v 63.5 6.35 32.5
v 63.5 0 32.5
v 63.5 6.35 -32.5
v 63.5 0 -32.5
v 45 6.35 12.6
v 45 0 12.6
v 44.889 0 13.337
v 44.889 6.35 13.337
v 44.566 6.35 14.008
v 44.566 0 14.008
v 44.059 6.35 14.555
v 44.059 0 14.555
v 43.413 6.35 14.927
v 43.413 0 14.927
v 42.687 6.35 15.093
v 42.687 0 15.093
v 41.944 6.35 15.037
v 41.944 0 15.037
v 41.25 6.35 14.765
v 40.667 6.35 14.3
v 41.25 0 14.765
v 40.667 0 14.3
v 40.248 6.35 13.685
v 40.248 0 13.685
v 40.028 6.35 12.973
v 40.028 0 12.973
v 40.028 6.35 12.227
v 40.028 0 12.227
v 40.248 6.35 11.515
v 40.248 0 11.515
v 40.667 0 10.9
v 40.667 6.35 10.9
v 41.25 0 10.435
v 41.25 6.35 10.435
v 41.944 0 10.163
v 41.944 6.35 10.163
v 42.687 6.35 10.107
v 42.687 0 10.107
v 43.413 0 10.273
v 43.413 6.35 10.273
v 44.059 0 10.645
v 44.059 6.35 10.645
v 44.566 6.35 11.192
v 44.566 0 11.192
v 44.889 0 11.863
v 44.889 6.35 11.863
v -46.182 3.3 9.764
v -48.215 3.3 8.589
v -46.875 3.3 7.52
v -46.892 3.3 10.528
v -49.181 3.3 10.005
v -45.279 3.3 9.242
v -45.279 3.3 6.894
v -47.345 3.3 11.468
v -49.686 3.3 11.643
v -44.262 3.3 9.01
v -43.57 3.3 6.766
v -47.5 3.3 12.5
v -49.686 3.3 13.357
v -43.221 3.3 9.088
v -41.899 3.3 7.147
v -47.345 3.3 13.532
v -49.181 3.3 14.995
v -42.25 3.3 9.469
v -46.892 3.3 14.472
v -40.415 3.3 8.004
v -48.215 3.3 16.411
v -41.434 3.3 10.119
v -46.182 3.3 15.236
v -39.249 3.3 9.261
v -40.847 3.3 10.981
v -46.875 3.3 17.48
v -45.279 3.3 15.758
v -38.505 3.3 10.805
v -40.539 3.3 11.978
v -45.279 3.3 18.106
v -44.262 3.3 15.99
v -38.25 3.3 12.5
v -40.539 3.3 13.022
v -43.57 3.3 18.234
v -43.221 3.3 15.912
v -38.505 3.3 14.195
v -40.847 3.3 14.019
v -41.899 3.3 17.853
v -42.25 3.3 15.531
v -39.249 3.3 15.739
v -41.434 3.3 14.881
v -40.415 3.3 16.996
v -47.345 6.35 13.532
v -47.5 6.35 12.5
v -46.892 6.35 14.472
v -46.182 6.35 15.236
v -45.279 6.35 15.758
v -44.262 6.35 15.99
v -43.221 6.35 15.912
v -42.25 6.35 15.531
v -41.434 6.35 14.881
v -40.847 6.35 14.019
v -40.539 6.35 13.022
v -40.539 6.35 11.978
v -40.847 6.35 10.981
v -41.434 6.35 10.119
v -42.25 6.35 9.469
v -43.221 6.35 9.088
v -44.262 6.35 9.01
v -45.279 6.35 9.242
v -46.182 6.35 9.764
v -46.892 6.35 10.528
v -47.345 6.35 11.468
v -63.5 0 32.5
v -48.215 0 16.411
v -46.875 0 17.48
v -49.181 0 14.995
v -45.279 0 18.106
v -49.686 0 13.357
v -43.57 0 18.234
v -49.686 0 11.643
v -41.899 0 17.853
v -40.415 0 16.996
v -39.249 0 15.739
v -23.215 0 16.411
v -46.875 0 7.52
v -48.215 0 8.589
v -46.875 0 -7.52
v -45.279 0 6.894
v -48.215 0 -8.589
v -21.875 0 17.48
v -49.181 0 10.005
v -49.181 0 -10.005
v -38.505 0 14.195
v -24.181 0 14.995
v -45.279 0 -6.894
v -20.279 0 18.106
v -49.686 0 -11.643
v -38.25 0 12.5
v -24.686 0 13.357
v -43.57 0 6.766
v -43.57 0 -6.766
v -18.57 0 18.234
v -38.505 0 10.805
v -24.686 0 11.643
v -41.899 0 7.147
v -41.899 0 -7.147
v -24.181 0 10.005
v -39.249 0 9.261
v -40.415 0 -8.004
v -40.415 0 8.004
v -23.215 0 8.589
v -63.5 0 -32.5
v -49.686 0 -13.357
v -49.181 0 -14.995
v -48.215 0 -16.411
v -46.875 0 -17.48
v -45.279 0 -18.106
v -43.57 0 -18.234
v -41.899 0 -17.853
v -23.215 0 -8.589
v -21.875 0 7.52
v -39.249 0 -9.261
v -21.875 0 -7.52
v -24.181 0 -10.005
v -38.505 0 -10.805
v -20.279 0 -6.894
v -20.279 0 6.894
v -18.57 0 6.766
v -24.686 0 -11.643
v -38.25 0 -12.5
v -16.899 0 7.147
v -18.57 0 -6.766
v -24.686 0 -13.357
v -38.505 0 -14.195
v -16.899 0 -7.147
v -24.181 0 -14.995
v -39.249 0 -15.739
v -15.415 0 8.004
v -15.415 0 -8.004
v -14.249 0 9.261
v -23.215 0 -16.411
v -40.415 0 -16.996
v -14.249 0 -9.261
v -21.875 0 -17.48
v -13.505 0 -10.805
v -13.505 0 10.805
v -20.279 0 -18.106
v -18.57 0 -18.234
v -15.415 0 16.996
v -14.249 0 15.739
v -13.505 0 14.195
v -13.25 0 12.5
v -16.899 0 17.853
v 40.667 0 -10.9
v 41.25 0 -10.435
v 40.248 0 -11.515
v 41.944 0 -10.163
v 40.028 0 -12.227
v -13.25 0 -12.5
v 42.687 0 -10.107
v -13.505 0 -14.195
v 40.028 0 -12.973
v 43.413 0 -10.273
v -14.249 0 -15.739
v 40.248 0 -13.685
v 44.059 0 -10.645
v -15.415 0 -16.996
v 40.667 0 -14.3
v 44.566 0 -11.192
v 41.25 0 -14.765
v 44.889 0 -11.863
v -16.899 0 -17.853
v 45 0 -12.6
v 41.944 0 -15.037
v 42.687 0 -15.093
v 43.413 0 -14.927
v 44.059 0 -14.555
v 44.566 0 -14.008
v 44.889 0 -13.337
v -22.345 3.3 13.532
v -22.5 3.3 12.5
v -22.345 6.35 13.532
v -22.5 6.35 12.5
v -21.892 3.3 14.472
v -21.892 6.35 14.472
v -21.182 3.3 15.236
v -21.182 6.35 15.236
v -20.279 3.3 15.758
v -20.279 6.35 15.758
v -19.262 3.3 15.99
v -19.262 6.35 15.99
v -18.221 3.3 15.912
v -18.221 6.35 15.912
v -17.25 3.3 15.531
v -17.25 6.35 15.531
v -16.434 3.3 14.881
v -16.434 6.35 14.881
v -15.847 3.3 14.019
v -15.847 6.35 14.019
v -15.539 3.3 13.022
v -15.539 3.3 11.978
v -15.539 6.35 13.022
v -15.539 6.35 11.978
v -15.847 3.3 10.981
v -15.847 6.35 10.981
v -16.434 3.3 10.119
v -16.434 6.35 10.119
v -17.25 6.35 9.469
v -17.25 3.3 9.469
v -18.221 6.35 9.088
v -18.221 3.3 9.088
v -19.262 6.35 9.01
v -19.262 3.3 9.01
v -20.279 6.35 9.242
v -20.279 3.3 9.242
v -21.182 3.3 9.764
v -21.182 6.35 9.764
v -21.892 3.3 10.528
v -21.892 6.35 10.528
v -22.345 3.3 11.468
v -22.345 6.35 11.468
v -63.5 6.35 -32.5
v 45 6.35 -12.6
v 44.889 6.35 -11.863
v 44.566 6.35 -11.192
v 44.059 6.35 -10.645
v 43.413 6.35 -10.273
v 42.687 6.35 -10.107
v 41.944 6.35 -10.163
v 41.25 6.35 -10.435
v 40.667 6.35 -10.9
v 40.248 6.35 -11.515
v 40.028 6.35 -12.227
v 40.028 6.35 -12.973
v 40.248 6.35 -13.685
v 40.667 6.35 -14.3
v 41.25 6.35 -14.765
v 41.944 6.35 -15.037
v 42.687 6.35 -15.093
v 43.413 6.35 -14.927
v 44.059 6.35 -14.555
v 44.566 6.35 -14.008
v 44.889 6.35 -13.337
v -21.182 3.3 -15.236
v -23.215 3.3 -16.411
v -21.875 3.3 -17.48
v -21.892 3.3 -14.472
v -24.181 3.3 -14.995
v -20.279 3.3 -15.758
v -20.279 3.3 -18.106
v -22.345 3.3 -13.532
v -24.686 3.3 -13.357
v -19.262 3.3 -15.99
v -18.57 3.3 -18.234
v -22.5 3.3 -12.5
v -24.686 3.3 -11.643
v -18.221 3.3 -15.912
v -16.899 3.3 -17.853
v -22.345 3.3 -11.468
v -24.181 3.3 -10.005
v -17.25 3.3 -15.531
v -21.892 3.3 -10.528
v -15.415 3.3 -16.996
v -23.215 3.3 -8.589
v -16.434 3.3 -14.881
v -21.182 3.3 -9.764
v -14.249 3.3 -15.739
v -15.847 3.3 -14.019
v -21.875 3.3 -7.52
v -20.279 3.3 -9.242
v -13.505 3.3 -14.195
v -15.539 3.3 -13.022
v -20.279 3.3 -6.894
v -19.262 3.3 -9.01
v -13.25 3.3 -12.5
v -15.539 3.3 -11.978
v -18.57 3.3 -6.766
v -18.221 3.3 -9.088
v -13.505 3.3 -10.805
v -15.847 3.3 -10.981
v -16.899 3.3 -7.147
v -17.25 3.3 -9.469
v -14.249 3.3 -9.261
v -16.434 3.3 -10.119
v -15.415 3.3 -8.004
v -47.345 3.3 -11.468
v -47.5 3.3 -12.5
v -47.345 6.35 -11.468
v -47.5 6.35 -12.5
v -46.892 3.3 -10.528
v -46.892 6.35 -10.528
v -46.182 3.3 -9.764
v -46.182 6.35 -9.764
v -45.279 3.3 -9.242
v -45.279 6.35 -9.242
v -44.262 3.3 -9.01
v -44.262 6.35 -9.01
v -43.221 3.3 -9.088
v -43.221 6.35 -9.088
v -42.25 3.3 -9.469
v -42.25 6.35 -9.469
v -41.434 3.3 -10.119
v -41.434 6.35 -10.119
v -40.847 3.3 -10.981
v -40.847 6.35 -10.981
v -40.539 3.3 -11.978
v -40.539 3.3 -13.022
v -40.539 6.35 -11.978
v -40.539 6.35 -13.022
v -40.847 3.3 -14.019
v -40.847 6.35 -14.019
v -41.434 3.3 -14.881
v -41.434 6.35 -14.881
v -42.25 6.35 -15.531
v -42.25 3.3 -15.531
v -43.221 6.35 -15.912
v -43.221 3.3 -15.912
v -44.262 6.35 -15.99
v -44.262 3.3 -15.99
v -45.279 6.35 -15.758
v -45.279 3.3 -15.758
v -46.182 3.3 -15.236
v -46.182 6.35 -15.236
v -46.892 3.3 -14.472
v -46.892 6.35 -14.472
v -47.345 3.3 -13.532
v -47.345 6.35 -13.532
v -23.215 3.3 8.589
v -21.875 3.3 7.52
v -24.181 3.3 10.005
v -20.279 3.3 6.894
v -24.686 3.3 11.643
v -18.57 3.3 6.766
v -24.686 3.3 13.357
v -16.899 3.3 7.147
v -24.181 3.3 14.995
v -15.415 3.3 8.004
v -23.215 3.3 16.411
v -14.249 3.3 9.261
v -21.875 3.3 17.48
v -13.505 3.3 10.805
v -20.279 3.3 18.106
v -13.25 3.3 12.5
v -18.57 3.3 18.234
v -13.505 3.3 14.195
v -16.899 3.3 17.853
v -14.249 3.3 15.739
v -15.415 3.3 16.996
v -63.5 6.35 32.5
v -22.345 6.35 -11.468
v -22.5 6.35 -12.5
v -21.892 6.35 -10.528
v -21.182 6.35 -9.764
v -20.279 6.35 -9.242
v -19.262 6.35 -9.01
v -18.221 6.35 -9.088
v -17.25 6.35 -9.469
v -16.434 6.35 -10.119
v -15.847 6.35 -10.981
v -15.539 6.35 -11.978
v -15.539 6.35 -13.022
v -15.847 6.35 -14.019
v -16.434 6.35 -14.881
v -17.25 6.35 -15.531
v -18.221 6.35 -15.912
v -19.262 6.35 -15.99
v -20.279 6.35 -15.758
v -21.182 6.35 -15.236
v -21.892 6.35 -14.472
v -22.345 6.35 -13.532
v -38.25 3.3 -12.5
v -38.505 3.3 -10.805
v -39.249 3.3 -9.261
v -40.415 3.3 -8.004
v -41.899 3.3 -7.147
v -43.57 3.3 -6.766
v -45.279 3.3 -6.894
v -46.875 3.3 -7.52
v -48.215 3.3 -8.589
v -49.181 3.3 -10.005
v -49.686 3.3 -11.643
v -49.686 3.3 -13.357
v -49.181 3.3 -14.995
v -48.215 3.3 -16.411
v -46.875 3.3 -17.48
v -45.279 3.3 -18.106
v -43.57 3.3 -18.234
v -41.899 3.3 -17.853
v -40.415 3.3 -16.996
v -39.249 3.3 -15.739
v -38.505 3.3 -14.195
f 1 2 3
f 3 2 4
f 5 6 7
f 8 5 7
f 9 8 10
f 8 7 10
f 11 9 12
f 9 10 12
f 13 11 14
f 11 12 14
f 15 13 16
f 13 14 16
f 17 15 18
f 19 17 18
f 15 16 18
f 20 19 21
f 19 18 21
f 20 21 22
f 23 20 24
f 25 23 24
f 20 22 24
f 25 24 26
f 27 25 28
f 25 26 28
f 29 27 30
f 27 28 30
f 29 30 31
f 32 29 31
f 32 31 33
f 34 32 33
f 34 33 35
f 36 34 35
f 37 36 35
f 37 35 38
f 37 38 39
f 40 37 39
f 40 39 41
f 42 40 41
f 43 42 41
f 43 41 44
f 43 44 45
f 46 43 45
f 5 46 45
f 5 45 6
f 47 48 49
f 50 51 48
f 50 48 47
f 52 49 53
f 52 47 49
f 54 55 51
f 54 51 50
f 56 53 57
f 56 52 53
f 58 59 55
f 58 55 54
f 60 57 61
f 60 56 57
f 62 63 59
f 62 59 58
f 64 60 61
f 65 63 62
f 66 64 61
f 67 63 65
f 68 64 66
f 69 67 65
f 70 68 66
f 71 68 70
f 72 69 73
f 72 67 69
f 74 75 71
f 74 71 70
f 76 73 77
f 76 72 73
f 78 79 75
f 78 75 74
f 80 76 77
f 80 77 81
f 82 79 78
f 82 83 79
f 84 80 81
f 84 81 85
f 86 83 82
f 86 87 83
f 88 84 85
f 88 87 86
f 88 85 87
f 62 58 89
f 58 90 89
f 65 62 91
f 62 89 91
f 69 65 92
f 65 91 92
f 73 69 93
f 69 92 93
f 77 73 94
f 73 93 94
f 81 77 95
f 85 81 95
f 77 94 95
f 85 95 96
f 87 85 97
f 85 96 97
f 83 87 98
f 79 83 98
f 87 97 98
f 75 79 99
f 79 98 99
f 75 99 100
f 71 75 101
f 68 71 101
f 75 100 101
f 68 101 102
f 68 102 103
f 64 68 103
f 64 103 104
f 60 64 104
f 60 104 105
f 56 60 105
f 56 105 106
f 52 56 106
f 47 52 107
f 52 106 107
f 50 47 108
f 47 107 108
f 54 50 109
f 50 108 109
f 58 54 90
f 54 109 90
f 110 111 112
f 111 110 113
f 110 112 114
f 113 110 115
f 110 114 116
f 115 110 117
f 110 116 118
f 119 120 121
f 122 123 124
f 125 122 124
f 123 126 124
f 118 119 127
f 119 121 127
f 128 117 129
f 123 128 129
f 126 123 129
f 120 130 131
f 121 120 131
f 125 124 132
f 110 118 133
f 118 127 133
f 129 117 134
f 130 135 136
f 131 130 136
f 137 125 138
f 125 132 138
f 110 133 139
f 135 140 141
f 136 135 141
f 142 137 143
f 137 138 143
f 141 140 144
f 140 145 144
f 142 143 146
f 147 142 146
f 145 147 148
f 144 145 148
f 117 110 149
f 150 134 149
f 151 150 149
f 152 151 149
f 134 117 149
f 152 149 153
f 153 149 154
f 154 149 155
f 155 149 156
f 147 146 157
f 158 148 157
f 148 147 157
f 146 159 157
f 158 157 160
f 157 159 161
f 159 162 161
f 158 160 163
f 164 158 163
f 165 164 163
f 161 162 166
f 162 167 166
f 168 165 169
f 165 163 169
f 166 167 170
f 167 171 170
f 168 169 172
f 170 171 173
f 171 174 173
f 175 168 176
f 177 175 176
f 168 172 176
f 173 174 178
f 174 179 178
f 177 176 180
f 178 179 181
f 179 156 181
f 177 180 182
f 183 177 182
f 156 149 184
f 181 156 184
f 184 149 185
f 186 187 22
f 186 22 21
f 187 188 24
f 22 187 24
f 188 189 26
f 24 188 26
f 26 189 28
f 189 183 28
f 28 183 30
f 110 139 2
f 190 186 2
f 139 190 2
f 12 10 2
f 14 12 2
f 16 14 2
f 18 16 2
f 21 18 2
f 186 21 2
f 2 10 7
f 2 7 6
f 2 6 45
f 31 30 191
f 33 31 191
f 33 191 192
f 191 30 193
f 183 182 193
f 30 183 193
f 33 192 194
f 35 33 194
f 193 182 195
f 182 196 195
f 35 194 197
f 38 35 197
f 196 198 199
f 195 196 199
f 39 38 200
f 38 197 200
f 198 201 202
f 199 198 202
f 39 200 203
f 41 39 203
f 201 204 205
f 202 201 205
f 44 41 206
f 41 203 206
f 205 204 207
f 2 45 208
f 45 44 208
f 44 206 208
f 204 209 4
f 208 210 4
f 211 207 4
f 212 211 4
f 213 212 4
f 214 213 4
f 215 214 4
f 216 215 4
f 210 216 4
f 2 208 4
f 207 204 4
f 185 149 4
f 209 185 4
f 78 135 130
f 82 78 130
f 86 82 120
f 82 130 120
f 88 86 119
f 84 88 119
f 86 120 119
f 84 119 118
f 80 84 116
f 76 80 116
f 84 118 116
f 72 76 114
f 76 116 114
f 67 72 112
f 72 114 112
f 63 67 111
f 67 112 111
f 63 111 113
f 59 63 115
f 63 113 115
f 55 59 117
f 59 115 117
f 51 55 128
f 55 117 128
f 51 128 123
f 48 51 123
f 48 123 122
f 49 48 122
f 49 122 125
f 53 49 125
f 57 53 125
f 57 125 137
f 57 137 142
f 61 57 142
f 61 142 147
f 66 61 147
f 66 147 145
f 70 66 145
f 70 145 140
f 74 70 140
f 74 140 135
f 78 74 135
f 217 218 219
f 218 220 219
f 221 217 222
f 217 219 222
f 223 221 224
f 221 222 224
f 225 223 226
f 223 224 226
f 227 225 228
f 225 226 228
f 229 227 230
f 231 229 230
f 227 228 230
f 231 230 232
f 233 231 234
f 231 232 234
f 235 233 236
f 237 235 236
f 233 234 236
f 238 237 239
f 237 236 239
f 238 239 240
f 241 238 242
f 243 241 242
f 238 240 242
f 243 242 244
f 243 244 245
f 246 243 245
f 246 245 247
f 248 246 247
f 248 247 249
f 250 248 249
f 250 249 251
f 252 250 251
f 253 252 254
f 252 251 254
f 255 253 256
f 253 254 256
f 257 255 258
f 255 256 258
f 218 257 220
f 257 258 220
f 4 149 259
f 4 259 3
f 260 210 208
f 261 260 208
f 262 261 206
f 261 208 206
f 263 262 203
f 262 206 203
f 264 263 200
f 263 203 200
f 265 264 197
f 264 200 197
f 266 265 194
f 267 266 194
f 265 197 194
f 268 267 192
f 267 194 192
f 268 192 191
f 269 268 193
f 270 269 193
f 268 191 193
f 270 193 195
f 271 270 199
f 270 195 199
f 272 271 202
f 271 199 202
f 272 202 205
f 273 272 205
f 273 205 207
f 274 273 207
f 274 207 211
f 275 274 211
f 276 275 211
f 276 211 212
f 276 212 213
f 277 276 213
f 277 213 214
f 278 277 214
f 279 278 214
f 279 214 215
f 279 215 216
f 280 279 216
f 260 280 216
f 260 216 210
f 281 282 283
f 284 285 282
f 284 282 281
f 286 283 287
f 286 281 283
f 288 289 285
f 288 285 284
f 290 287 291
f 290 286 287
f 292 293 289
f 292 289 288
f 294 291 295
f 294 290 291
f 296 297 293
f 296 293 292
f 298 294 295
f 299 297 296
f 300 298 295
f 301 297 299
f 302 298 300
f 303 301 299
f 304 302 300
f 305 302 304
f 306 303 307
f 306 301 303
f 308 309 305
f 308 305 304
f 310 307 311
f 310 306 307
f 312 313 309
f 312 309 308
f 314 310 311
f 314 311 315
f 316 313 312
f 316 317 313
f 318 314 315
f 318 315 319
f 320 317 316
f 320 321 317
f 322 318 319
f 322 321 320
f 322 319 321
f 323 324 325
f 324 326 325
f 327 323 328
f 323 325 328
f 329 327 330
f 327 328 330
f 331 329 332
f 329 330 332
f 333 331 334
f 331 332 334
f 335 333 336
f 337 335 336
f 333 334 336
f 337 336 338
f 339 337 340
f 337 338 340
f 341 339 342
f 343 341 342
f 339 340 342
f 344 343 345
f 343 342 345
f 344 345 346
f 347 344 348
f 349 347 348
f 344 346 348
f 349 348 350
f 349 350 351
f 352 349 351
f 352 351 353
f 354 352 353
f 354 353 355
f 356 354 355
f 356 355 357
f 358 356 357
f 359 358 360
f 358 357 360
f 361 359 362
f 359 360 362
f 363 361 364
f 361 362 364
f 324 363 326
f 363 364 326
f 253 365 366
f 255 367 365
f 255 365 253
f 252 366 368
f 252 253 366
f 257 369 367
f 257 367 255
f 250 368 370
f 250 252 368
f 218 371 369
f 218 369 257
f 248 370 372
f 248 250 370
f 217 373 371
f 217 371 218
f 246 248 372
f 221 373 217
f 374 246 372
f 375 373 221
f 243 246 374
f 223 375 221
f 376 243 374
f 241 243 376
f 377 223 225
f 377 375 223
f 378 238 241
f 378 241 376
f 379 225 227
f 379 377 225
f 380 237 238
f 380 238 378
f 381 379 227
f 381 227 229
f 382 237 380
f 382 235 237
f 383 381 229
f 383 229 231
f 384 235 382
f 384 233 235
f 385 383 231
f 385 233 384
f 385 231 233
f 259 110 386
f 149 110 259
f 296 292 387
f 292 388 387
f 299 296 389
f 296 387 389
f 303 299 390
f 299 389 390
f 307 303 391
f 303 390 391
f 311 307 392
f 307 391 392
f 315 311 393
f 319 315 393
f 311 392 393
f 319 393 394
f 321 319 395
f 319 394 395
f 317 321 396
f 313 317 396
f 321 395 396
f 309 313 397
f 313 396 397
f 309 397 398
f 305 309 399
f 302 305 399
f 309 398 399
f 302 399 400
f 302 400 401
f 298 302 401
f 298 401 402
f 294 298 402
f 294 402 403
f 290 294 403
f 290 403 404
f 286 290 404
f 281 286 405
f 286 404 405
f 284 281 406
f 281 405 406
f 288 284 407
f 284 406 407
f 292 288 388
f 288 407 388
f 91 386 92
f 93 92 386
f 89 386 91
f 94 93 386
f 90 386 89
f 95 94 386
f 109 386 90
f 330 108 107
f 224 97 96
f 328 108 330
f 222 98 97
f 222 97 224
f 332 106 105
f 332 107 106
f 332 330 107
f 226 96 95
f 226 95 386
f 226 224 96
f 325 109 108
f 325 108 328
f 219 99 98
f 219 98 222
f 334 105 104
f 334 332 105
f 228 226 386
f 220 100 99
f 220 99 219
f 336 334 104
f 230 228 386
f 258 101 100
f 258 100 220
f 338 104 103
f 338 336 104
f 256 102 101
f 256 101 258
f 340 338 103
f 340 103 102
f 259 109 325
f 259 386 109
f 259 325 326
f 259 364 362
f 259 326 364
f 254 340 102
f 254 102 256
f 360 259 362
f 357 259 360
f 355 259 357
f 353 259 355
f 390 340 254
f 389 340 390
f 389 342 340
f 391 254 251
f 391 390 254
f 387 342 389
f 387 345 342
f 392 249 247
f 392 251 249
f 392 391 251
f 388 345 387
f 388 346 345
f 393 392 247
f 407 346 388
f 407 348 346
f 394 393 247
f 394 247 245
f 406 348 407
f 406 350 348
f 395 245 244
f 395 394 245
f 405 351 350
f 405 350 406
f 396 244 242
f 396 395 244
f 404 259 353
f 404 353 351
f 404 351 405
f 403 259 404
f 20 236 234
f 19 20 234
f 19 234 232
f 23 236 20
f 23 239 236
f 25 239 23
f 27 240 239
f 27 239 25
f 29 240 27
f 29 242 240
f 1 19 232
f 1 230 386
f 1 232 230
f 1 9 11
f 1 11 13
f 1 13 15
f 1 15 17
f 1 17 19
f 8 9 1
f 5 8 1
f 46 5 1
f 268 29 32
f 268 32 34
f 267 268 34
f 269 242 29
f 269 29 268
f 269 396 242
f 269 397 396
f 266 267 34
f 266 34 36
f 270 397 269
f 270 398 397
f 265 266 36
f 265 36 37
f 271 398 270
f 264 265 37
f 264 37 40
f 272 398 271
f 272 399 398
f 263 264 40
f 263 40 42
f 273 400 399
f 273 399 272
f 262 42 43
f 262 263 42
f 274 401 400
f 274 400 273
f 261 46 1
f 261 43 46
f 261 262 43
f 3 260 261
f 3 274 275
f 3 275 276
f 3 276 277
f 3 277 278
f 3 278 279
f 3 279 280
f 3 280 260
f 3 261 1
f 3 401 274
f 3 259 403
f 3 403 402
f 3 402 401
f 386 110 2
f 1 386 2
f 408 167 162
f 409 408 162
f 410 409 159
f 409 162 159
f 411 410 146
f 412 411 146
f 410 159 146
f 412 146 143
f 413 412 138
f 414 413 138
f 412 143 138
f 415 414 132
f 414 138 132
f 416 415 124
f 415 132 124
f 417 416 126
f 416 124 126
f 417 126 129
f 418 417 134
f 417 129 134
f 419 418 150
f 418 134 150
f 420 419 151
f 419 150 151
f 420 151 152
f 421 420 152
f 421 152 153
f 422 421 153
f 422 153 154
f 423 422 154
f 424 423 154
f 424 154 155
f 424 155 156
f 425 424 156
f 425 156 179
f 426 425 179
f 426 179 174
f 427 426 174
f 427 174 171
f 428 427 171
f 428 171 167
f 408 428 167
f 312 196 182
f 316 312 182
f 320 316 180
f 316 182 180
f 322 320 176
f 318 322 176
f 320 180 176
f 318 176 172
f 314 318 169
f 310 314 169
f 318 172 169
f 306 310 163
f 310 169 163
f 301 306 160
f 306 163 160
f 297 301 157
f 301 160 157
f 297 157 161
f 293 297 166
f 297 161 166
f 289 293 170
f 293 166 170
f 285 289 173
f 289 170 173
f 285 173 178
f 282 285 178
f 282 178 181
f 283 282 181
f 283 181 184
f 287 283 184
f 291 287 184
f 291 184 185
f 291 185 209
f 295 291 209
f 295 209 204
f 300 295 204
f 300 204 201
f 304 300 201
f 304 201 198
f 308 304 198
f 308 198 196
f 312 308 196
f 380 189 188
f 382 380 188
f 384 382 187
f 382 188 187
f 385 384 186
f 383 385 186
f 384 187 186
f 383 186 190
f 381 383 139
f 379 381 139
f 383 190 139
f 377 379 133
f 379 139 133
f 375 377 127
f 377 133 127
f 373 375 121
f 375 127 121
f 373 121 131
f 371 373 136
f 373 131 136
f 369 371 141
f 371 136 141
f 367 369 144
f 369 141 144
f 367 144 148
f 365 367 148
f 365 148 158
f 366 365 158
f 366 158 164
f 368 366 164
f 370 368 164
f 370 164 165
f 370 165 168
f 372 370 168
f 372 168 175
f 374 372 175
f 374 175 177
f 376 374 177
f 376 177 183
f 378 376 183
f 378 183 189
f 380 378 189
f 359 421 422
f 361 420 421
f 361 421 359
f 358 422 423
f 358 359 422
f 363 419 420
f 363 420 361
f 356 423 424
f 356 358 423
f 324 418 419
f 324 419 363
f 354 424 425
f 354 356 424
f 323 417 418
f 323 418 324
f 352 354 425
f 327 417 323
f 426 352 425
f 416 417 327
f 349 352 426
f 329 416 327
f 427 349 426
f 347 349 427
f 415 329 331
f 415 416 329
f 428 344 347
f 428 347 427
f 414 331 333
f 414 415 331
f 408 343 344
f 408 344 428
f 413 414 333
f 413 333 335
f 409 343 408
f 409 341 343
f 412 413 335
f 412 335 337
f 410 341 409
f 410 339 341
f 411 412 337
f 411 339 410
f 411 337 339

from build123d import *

# Parameters (mm, degrees)
SKETCH1_W                       = 127
SKETCH1_H                       = 65
EXTRUDE1_DEPTH                  = 6.35
M6X1_0_TAPPED_HOLE1_D           = 5
CBORE_FOR_M6_SBHCS1_D           = 7
CBORE_FOR_M6_SBHCS1_CBORE_D     = 11.5
CBORE_FOR_M6_SBHCS1_CBORE_DEPTH = 3.3


with BuildPart() as part:
    # Sketch1 → Extrude1 (new body)
    with BuildSketch(Plane(origin=(0, 0, 0), x_dir=(1, 0, 0), z_dir=(0, 1, 0))):
        Rectangle(SKETCH1_W, SKETCH1_H)
    extrude(amount=EXTRUDE1_DEPTH)

    # M6x1.0 Tapped Hole1 (through all)
    with Locations(Plane(origin=(0, 6.35, 0), x_dir=(-1, 0, 0), z_dir=(0, 1, 0))):
        with Locations((-42.5, -12.6), (-42.5, 12.6)):
            Hole(M6X1_0_TAPPED_HOLE1_D / 2)

    # CBORE for M6 SBHCS1 (through all)
    with Locations(Plane.XZ):
        with Locations((-44, 12.5), (-19, 12.5), (-19, -12.5), (-44, -12.5)):
            CounterBoreHole(CBORE_FOR_M6_SBHCS1_D / 2, CBORE_FOR_M6_SBHCS1_CBORE_D / 2, CBORE_FOR_M6_SBHCS1_CBORE_DEPTH)


solid = part.part
